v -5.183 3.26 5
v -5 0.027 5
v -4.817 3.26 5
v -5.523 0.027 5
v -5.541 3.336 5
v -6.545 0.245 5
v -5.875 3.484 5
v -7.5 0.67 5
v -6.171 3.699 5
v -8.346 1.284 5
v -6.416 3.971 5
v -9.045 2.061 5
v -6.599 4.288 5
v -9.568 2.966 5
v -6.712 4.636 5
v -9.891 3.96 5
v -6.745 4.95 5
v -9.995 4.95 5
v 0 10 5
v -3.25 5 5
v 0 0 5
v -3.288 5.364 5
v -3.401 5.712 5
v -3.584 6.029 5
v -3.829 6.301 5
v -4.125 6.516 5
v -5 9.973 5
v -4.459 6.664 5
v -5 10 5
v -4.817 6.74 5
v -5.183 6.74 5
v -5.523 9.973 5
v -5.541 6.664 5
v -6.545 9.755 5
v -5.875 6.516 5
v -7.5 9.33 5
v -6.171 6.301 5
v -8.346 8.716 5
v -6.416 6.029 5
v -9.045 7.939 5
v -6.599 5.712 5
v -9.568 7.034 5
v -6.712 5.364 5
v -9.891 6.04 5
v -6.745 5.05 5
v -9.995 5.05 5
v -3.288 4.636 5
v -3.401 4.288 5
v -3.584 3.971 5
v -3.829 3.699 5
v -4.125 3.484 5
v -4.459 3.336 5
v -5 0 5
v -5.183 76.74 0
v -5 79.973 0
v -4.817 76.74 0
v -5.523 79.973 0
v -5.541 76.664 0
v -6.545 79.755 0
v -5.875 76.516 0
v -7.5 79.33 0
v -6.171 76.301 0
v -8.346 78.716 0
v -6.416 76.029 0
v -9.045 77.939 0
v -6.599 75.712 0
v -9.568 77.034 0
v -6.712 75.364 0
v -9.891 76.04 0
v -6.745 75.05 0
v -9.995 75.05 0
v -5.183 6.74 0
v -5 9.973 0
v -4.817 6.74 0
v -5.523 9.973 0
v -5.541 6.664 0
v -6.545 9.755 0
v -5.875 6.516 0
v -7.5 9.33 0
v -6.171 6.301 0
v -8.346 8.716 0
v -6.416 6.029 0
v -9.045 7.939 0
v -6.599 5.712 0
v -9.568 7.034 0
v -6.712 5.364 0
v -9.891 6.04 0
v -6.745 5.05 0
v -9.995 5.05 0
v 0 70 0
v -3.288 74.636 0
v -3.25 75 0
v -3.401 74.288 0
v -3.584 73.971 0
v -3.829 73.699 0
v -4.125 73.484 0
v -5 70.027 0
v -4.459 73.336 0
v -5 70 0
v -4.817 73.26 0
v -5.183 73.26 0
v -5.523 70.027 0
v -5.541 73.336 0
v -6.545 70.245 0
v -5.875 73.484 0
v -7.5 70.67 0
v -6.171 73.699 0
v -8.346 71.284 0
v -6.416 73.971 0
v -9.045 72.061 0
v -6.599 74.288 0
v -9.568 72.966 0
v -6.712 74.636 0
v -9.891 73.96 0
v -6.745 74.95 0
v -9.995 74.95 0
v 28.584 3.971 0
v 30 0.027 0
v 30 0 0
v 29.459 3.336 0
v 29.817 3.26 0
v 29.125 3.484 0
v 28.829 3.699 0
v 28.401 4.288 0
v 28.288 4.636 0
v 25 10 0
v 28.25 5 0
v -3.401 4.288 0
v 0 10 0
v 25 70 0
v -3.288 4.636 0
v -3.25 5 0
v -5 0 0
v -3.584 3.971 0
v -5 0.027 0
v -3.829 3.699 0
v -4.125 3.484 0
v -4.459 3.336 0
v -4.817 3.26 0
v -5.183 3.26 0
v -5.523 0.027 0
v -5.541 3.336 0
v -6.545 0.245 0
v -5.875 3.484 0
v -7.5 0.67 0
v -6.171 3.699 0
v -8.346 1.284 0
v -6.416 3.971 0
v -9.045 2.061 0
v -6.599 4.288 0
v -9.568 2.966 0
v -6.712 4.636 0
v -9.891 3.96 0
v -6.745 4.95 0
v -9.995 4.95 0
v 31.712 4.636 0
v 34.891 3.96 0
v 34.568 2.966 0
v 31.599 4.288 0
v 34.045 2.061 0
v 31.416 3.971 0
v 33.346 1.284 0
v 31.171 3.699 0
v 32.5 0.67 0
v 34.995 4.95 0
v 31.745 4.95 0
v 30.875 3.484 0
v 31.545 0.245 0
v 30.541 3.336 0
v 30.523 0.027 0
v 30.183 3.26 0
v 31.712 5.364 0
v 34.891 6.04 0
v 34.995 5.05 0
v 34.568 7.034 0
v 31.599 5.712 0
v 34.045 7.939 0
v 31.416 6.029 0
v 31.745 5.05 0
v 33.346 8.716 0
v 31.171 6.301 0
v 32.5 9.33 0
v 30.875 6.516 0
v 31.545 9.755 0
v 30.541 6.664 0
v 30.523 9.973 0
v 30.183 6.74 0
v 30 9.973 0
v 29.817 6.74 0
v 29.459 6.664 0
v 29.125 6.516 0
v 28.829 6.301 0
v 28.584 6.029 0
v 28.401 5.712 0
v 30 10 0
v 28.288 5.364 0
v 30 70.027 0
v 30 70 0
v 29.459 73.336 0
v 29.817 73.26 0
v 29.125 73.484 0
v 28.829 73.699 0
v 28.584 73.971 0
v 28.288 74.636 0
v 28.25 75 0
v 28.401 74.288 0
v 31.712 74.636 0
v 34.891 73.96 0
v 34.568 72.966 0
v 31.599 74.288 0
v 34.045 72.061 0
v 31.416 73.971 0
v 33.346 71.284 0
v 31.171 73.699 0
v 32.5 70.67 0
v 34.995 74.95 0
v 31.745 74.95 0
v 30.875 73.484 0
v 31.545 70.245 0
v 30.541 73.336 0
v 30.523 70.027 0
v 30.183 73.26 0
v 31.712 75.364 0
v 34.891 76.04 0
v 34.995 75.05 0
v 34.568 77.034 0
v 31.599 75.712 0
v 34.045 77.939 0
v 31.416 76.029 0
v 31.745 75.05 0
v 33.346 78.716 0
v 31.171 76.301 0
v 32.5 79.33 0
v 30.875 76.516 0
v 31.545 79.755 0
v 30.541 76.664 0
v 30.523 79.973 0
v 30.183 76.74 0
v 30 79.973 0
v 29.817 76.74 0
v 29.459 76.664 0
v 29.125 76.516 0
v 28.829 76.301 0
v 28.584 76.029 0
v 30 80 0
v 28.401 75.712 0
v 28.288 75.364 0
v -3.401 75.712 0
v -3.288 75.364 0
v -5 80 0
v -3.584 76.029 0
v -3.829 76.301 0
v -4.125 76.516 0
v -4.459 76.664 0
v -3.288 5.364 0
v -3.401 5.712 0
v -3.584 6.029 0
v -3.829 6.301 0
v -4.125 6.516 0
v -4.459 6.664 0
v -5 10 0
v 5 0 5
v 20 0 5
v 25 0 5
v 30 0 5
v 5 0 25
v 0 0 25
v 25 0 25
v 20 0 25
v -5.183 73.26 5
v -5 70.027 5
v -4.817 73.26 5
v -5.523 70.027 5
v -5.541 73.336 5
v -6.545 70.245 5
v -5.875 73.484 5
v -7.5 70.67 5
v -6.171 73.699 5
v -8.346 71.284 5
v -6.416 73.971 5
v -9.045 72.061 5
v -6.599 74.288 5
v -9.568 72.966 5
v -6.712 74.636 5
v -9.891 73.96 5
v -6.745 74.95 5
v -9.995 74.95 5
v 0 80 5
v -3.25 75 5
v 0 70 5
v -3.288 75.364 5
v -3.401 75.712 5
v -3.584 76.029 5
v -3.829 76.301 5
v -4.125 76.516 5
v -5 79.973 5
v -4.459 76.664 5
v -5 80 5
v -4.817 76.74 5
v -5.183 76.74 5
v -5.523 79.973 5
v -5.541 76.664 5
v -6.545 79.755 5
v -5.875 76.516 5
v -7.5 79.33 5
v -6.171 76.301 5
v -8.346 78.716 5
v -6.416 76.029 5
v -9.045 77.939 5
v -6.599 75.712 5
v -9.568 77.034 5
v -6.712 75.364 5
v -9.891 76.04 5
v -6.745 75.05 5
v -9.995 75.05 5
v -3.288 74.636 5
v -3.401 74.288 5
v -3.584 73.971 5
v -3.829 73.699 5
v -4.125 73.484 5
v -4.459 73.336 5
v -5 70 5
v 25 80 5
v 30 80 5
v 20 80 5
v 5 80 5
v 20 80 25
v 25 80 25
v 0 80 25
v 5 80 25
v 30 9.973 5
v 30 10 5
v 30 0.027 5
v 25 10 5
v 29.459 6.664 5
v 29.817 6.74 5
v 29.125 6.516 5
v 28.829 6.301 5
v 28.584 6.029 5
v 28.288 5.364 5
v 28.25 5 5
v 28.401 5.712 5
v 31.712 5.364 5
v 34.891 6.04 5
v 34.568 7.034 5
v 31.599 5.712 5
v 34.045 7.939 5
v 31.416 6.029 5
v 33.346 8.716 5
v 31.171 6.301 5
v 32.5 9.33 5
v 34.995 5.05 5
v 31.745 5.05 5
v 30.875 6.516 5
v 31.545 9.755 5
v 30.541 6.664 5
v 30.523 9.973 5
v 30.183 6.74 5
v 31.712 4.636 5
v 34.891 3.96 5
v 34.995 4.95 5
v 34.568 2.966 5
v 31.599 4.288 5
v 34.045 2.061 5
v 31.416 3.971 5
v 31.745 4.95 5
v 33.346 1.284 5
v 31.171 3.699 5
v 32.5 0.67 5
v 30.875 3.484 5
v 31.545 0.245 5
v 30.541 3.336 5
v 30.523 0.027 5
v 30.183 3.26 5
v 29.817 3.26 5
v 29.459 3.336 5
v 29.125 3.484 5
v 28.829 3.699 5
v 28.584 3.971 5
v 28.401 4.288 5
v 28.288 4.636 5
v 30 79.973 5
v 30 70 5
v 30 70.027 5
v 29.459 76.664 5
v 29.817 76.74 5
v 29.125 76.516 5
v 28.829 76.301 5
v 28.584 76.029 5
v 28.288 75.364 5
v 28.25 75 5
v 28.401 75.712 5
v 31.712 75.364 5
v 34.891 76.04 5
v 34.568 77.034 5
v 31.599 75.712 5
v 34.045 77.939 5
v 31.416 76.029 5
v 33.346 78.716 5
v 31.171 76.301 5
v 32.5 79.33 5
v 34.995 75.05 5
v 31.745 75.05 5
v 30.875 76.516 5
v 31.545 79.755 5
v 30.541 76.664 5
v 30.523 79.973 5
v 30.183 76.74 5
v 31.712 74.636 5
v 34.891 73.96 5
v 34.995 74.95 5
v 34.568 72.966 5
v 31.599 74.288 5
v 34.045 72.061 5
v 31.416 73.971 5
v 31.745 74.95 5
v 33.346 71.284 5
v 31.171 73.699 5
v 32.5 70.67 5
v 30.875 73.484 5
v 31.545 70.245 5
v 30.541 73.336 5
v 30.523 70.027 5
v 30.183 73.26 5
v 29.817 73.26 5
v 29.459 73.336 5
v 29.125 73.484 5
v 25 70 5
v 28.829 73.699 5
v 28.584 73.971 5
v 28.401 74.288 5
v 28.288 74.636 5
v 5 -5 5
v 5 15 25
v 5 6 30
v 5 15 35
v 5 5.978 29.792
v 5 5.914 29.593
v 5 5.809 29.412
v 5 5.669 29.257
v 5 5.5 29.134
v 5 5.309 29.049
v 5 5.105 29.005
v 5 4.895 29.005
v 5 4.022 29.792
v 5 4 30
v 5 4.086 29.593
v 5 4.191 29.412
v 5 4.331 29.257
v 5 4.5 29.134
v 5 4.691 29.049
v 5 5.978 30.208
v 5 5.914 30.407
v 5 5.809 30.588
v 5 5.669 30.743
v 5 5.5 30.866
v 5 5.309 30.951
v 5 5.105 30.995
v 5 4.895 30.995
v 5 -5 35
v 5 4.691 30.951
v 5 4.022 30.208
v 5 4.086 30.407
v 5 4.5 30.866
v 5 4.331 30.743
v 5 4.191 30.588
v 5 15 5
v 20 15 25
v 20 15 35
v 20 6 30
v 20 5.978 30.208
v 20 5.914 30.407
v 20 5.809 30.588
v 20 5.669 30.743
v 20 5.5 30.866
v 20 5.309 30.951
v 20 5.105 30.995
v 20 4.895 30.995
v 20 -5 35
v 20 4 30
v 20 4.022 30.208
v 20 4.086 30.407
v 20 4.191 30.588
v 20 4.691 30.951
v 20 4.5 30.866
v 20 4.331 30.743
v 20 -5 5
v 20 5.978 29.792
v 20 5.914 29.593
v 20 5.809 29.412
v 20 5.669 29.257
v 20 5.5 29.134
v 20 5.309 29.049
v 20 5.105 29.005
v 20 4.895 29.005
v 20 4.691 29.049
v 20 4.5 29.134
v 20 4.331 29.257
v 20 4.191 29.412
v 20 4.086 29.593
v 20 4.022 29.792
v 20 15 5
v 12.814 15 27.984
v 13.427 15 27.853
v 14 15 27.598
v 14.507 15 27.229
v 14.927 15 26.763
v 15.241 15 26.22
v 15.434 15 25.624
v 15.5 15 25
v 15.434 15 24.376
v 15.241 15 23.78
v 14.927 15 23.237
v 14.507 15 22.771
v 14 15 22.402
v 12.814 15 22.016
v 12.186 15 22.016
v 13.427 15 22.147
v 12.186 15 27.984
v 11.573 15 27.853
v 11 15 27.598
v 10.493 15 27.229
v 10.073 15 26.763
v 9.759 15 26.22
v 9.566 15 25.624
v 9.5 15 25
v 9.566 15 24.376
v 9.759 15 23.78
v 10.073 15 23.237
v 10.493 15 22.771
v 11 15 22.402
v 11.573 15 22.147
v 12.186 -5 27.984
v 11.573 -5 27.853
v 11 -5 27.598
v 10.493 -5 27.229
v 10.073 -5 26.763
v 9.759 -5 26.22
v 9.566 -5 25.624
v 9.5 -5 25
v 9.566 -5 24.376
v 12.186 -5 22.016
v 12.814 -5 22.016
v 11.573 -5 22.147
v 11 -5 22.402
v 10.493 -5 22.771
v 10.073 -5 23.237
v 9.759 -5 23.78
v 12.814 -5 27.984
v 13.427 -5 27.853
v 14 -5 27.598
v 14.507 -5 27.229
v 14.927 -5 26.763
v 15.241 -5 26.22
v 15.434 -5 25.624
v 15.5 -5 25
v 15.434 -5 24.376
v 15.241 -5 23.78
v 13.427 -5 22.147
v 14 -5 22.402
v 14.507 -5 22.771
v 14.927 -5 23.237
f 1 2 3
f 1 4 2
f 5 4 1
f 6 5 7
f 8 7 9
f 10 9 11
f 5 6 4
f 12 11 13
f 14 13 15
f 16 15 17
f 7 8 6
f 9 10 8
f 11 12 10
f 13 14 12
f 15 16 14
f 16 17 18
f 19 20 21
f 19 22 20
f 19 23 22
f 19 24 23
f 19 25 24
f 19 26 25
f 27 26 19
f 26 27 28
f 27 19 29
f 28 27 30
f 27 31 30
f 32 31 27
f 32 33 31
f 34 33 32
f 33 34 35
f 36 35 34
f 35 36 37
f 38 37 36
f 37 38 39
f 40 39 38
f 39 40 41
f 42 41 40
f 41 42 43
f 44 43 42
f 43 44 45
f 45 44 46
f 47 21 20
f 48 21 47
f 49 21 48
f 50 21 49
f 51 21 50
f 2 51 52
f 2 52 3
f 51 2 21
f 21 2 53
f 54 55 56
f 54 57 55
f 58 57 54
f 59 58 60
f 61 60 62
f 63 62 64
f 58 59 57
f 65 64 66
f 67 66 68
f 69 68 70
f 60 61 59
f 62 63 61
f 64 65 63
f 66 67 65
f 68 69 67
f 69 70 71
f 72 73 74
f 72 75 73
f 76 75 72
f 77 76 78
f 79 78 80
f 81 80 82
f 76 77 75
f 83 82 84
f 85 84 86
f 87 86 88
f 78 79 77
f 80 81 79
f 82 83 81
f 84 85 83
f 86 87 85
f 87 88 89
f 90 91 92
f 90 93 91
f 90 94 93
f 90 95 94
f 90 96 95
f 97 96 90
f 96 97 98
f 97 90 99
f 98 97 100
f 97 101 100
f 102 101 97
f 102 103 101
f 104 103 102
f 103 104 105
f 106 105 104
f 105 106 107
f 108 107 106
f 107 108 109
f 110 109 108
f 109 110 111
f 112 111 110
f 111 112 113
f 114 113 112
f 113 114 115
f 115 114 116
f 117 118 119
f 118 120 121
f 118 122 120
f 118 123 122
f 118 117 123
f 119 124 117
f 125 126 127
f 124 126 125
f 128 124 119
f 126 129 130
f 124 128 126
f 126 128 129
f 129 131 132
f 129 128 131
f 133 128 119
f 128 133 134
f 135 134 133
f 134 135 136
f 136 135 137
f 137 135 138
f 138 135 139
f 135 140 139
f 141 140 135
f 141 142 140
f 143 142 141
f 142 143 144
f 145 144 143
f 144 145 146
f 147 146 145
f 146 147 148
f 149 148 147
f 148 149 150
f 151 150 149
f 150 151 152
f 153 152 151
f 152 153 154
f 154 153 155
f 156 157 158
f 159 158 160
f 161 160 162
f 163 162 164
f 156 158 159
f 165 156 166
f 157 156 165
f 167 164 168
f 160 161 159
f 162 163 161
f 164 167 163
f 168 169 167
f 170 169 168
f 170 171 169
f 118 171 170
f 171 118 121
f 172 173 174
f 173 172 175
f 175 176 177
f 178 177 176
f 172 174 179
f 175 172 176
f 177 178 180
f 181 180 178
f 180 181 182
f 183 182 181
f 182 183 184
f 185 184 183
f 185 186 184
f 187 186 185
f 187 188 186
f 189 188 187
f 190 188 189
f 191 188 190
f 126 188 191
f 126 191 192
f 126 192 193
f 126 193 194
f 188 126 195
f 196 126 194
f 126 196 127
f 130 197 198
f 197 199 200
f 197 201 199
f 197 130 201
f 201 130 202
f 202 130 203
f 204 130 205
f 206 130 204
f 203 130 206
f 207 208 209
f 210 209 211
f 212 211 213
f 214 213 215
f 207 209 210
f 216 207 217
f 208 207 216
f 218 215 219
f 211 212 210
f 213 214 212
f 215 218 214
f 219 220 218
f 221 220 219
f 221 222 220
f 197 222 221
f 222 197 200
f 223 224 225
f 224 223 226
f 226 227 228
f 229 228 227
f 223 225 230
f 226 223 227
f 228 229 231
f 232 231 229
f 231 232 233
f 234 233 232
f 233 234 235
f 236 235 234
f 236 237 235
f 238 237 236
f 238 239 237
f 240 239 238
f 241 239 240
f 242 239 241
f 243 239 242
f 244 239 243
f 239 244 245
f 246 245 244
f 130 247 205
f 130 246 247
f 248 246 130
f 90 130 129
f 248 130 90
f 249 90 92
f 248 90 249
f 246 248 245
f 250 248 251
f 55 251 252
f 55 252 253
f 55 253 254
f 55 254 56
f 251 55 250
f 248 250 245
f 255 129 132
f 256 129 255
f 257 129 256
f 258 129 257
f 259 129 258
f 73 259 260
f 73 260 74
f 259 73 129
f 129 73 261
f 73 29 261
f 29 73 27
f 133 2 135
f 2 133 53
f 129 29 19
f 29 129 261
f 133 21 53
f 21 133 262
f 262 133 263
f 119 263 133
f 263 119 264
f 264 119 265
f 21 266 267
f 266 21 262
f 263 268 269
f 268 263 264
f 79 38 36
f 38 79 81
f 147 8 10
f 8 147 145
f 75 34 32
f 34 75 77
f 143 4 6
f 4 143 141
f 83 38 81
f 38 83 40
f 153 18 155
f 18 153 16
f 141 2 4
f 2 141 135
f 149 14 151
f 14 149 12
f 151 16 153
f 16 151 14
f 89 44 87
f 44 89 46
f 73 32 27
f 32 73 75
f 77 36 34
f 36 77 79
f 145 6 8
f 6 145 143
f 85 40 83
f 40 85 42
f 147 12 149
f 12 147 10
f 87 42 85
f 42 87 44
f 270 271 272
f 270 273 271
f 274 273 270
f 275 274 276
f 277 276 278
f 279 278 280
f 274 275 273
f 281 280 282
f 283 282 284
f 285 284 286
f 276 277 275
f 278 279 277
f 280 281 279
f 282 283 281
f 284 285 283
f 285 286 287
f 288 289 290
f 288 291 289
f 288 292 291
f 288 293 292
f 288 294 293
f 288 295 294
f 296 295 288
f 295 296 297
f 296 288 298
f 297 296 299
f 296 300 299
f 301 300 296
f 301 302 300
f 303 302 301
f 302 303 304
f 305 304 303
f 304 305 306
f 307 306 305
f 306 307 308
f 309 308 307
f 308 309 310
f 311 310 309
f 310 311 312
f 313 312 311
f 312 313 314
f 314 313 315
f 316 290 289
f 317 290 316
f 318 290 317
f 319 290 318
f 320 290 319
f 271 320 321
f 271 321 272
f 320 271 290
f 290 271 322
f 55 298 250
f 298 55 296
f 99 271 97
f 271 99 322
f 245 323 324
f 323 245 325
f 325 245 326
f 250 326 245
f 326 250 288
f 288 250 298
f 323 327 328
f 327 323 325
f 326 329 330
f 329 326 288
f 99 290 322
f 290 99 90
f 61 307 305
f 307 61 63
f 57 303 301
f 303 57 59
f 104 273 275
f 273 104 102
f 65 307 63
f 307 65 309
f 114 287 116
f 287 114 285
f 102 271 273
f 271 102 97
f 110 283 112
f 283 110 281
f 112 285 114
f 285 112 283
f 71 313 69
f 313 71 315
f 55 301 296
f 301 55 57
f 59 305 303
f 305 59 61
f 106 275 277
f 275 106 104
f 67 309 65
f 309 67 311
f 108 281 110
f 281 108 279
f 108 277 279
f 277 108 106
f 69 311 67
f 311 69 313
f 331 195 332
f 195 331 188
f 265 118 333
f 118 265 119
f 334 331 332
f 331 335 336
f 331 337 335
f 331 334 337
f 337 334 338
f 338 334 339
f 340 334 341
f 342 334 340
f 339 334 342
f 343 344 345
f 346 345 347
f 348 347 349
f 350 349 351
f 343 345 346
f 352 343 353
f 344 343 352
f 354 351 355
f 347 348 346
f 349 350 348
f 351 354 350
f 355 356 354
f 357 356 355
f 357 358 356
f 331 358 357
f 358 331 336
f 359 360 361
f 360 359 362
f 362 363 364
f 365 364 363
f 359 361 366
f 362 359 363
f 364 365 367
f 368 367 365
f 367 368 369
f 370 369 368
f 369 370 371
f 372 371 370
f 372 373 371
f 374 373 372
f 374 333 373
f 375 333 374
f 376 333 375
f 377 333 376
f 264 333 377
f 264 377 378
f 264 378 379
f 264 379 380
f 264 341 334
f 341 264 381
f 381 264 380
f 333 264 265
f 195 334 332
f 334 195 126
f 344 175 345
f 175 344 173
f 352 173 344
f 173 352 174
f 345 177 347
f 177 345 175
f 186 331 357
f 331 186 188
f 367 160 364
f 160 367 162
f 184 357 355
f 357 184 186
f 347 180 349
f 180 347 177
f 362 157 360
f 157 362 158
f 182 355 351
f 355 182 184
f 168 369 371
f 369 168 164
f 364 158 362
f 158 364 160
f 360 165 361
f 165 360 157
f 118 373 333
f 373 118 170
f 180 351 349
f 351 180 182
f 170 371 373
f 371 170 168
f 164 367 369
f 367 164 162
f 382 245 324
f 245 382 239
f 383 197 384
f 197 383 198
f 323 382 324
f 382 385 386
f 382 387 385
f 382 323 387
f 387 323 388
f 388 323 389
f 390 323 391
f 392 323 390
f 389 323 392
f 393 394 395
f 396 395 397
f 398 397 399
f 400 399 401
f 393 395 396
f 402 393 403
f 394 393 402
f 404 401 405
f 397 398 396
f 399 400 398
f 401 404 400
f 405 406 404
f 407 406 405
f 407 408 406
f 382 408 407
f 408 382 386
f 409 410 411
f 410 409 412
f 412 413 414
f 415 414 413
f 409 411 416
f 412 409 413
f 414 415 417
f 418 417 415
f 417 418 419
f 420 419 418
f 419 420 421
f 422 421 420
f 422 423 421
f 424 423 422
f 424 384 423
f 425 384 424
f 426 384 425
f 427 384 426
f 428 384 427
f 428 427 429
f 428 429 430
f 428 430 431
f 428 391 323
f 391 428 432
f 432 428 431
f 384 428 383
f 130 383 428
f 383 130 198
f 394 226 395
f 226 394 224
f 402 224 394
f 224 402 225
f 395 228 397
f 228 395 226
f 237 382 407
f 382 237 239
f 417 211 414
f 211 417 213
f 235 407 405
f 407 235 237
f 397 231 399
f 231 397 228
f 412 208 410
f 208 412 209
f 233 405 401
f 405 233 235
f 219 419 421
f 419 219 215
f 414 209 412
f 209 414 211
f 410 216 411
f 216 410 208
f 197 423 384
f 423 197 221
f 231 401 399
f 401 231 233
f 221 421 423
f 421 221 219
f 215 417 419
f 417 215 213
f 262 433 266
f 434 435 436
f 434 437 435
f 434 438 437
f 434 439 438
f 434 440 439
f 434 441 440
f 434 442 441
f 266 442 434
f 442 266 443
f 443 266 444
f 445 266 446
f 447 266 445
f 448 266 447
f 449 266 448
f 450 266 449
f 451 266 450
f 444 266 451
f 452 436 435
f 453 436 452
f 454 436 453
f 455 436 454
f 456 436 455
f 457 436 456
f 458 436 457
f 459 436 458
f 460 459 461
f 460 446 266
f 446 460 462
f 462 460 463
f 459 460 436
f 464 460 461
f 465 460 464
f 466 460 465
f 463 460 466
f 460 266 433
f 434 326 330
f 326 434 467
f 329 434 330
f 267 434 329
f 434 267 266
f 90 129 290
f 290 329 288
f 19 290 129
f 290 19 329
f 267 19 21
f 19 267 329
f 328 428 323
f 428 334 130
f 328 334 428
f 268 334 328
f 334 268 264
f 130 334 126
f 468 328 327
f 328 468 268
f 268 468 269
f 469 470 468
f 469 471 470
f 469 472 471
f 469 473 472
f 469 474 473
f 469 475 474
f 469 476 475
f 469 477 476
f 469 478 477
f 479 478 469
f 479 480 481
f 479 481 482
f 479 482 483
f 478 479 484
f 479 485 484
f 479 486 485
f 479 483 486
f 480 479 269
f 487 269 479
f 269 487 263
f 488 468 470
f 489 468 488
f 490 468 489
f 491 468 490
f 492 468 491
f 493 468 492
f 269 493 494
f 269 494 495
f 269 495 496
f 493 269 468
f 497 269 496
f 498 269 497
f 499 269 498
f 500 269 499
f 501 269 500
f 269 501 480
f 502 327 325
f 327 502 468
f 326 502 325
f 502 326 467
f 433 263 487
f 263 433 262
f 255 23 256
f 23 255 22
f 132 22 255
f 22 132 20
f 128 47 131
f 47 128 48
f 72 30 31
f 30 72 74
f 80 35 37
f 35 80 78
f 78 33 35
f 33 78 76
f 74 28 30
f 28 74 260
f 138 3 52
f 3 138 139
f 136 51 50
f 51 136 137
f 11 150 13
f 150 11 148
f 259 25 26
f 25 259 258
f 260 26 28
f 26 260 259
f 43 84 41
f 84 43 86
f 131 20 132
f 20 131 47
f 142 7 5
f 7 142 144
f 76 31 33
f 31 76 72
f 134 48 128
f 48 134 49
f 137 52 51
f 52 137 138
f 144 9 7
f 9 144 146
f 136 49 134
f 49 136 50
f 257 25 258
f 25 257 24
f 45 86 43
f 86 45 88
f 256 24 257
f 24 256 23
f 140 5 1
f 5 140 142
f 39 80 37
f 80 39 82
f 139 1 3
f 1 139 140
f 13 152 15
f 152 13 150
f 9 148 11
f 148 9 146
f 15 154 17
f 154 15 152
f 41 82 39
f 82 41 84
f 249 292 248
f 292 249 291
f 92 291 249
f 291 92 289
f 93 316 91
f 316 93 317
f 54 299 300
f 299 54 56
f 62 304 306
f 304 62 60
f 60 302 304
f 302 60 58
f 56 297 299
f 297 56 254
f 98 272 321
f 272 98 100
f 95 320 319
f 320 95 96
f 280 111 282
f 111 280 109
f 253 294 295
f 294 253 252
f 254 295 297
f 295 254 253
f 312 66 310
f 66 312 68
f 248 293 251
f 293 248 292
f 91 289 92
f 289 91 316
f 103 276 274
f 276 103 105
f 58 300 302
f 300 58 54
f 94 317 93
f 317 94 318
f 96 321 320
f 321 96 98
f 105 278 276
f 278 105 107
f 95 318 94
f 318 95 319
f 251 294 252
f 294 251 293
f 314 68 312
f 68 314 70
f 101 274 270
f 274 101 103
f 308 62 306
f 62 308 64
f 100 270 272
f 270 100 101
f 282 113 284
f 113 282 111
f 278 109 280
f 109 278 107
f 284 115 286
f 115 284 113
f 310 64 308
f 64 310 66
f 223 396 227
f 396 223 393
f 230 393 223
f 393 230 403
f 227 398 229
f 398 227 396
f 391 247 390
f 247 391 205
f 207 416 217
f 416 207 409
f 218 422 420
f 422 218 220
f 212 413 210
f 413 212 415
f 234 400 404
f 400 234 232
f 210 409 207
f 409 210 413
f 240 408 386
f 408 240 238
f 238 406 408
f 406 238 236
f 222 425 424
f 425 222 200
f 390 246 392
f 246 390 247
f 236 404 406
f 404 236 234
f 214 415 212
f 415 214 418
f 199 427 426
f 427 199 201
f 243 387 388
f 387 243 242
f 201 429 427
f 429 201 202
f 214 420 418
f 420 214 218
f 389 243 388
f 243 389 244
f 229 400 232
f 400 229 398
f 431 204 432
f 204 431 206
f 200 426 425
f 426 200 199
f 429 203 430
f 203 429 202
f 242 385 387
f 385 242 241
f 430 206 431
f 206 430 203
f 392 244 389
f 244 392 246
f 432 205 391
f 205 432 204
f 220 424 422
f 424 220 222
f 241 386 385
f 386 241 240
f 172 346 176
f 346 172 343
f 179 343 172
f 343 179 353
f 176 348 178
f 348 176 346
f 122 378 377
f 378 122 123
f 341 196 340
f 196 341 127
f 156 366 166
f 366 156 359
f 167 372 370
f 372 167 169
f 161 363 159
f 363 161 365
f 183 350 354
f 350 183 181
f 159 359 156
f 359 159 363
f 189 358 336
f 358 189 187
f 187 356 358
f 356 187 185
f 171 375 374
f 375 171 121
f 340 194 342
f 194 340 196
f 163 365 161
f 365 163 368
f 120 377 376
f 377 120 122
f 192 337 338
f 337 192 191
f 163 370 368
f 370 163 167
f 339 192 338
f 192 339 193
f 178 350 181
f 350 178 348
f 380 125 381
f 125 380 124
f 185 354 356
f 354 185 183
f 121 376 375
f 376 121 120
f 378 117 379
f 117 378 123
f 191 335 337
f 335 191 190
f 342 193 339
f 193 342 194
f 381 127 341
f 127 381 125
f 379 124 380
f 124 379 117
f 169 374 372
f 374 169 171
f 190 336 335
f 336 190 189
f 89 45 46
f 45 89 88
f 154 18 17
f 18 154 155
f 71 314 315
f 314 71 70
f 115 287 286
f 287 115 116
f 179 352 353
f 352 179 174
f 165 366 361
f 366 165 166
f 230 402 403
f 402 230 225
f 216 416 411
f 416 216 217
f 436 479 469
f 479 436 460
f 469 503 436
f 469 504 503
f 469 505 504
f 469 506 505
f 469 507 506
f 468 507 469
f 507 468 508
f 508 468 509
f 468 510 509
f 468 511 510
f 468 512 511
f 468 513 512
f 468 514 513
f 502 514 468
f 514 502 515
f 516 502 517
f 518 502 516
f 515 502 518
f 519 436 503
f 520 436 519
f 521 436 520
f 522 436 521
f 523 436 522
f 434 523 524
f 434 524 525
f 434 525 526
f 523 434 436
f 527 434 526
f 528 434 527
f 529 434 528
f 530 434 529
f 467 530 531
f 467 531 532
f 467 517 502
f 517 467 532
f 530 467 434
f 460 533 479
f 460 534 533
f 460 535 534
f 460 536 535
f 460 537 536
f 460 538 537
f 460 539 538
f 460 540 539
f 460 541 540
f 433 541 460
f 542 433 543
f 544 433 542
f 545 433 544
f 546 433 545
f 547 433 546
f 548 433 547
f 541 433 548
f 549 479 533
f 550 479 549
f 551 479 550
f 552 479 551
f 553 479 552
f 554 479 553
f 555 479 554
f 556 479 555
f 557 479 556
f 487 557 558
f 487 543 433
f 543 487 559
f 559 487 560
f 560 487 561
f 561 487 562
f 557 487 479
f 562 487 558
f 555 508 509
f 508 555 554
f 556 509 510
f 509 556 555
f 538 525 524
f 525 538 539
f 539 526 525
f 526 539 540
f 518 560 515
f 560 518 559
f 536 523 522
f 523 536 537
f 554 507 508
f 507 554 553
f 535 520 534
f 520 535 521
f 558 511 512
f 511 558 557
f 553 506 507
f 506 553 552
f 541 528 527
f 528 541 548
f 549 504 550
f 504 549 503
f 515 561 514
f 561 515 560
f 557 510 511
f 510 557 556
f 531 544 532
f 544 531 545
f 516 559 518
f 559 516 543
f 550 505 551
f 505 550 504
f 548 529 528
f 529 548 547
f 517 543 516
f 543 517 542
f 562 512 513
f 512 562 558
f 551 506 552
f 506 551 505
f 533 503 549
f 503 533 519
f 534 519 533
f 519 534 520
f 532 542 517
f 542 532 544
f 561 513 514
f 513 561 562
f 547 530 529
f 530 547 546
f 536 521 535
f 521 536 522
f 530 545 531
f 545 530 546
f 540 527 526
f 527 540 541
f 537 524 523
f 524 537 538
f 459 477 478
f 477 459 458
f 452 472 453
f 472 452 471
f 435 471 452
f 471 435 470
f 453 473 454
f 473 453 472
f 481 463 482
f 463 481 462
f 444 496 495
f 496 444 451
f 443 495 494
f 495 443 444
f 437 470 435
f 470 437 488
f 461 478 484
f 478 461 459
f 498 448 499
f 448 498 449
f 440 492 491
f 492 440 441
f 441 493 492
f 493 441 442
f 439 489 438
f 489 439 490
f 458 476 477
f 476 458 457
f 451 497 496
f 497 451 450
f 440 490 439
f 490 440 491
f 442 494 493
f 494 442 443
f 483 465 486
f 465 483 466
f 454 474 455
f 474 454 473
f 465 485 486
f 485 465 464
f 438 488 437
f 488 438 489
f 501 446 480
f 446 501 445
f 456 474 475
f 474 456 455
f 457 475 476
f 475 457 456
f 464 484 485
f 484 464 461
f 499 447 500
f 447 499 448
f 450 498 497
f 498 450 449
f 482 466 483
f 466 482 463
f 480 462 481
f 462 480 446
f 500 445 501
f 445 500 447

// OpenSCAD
module track(dxf = false)
{
	$fs = 0.1;
	
	wall = 5;
	length = 80;
	width = wall*5;
	crossBarDia = length-2;
	height = 25;

	bolt = 3.5;
	fudge = 0.25;
	bump = 5;

	x1 = -wall;
	y1 = wall;
	x2 = -wall;
	y2 = length-wall;
	x3 = width+wall;
	y3 = length-wall;
	x4 = width+wall;
	y4 = wall;
	
	if (dxf)
	{
		difference()
		{
			union()
			{
				square([width, length]);
				translate([-wall, 0, 0])
					square([width+wall*2, wall*2]);
				translate([-wall, length-wall*2, 0])
					square([width+wall*2, wall*2]);
				translate([x1, y1, 0])
					circle(r=wall, center=true);
				translate([x2, y2, 0])
					circle(r=wall, center=true);
				translate([x3, y3, 0])
					circle(r=wall, center=true);
				translate([x4, y4, 0])
					circle(r=wall, center=true);
			}
			
			translate([x1, y1, 0])
				circle(r=realBolt/2, center=true);
			translate([x2, y2, 0])
				circle(r=realBolt/2, center=true);
			translate([x3, y3, 0])
				circle(r=realBolt/2, center=true);
			translate([x4, y4, 0])
				circle(r=realBolt/2, center=true);
		}
	}
	else
	{
		difference()
		{
			union()
			{
				//the main vertical housing
				cube([wall, length, height]);
				translate([width-wall, 0, 0])
					cube([wall, length, height]);
				cube([width, length, wall]);
			
				//bumps as guide railing
				/*
				translate([wall*0.75, length, (height-wall)/2+wall])
					rotate([90, 0, 0])
						cylinder(r=bump/2, h=length);
				translate([width-wall*0.75, length, (height-wall)/2+wall])
					rotate([90, 0, 0])
						cylinder(r=bump/2, h=length);
				*/
				
				//flanges for mounting.
				translate([-wall, 0, 0])
				{
					cube([wall*2, wall*2, wall]);
					translate([0, wall, 0])
						cylinder(r=wall, h=wall);
				}
				translate([-wall, length-wall*2, 0])
				{
					cube([wall*2, wall*2, wall]);
					translate([0, wall, 0])
						cylinder(r=wall, h=wall);
				}
				translate([width-wall, 0, 0])
				{
					cube([wall*2, wall*2, wall]);
					translate([wall*2, wall, 0])
						cylinder(r=wall, h=wall);
				}
				translate([width-wall, length-wall*2, 0])
				{
					cube([wall*2, wall*2, wall]);
					translate([wall*2, wall, 0])
						cylinder(r=wall, h=wall);
				}
			}

			//bolt heads for flange
			translate([x1, y1, -1])
				cylinder(r=bolt/2, h=wall+2);
			translate([x2, y2, -1])
				cylinder(r=bolt/2, h=wall+2);
			translate([x3, y3, -1])
				cylinder(r=bolt/2, h=wall+2);
			translate([x4, y4, -1])
				cylinder(r=bolt/2, h=wall+2);
		
			//these are our hole placements.
			echo(x1, y1);
			echo(x2, y2);
			echo(x3, y3);
			echo(x4, y4);
		
			//tiny slices for path simplification.
			translate([-wall*2, wall, wall/2])
				cube(size=[wall*2, 0.1, wall], center=true);
			translate([-wall*2, length-wall, wall/2])
				cube(size=[wall*2, 0.1, wall], center=true);
			translate([width+wall*2, wall, wall/2])
				cube(size=[wall*2, 0.1, wall], center=true);
			translate([width+wall*2, length-wall, wall/2])
				cube(size=[wall*2, 0.1, wall], center=true);
		}
	}
}

module carriage()
{
	$fs = 0.1;
	
	wall = 5;
	bump = 5;
	width = wall*3;
	length = wall*4;
	height = 30;
	
	difference()
	{
		//our main body
		cube([width, length, height]);
		
		/*
		//indents for guide railing
		translate([-wall*0.25, length+1, 25/2-bump/2])
			rotate([90, 0, 0])
				cylinder(r=bump/2, h=length+2);
		translate([width+wall*0.25, length+1, 25/2-bump/2])
			rotate([90, 0, 0])
				cylinder(r=bump/2, h=length+2);
		*/
		
		//hole for the drive shaft
		translate([width/2, length+1, 20])
			rotate([90, 0, 0])
				cylinder(r=3, h=length+2);
		//nut for the drive shaft
		translate([width/2, 4, 20])
			rotate([90, 90, 0])
				scale([8, 8, 0])
					dxf_linear_extrude("nut.dxf", 4);
				
		//hole for the wire
		translate([-1, length/2, height-wall])
			rotate([90, 0, 90])
				#cylinder(r=1, h=width+2);
				
	}
}

//track(true);
track();
translate([5, -5, 5])
	carriage();
